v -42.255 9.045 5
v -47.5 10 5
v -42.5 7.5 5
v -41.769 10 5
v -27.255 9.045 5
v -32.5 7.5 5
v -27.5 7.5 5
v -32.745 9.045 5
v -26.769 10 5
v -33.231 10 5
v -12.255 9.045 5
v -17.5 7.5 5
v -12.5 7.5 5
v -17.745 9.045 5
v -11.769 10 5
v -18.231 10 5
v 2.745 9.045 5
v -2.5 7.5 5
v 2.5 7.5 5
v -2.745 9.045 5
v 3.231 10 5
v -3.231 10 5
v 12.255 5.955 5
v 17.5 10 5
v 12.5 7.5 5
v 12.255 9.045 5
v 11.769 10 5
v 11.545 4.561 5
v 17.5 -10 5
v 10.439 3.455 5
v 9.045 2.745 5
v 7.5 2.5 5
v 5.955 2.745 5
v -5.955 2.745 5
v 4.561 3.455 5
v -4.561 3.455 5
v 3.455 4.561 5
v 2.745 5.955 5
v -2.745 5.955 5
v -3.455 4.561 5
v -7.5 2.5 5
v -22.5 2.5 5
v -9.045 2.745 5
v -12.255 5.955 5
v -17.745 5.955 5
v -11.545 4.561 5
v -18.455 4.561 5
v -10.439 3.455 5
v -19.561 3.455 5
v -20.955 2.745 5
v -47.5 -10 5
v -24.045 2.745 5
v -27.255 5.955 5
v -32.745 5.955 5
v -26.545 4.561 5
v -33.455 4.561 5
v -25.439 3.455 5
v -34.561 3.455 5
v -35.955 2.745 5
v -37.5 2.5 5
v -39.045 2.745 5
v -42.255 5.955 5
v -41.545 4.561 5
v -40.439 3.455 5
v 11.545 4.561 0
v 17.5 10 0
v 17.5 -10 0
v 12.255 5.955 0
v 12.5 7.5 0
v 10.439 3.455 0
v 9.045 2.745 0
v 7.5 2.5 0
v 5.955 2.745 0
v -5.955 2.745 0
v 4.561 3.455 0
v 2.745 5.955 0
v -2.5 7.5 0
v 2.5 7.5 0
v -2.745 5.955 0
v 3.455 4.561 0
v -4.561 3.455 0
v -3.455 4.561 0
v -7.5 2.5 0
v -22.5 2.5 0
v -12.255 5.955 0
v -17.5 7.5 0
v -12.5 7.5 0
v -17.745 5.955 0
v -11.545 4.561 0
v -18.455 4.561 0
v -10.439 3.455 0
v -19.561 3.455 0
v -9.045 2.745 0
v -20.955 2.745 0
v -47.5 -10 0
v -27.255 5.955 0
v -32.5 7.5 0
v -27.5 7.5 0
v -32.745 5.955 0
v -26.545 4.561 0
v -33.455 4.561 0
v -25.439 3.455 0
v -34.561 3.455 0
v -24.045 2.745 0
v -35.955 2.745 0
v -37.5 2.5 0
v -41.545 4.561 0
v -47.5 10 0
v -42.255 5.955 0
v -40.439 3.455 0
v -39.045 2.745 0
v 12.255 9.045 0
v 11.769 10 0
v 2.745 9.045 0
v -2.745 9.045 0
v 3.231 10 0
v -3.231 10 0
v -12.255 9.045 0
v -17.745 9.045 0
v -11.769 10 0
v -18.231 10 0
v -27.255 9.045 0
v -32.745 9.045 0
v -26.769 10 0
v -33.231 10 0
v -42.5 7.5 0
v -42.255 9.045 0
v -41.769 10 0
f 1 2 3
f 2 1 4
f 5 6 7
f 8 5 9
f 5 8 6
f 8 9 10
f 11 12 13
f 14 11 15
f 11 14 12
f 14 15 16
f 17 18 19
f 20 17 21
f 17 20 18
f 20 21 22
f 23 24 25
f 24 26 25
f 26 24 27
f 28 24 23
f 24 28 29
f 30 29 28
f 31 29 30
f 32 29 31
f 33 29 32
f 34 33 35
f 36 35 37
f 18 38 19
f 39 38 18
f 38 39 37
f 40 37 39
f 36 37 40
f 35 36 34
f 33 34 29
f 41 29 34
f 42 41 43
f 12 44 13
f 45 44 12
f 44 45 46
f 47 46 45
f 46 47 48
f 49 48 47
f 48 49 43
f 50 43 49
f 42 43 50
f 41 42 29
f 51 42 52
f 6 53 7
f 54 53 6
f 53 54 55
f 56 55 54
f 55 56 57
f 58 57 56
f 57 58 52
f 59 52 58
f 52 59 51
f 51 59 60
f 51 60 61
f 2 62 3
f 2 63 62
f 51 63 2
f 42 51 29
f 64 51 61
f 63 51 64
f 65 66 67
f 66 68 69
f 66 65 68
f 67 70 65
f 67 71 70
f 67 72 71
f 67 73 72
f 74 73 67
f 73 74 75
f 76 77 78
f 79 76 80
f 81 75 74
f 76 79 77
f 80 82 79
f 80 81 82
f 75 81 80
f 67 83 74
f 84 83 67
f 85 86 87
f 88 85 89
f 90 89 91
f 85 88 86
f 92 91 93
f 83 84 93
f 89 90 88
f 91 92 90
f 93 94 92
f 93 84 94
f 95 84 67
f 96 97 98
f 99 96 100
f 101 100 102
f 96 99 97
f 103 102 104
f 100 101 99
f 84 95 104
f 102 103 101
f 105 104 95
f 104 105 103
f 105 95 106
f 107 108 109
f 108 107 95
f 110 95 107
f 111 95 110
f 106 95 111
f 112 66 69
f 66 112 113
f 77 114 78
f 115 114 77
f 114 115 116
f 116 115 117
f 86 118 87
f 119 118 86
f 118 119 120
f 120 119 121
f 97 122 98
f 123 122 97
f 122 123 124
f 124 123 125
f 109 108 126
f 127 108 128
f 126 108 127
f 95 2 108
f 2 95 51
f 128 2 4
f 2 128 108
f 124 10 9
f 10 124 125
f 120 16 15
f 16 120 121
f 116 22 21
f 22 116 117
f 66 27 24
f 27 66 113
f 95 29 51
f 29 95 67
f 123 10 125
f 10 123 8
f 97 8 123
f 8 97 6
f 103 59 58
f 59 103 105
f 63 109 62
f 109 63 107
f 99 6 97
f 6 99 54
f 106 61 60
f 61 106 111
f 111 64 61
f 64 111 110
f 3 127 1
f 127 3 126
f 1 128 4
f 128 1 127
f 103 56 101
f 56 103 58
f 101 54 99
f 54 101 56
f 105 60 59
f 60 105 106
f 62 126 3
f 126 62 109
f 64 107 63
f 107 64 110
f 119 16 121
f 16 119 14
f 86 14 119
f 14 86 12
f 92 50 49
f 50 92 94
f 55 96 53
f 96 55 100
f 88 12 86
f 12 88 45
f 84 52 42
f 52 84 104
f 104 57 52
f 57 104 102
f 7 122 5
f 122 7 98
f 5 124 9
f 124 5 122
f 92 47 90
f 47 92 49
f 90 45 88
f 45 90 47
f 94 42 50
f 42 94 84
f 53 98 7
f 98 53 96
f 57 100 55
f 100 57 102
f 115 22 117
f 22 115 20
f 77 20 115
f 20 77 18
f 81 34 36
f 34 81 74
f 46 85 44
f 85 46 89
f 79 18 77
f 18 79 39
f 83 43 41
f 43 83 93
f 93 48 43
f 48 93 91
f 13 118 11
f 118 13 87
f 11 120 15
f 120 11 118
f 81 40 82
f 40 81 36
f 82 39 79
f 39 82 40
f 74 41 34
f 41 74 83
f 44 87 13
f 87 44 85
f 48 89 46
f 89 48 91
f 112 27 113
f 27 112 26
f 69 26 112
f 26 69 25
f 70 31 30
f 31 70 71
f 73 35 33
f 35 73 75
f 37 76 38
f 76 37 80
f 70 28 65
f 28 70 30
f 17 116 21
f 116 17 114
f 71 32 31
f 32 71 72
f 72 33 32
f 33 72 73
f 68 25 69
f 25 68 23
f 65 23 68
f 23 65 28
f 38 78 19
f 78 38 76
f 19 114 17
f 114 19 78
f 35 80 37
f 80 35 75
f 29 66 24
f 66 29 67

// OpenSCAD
//Number of wires (2-6)
a=4;
//Spark Plug Wire Size (8-11mm)
b=10;

$fn=20;

module holder();
difference(){
    translate([0,0,2.5])cube([95, 20, 5], center=true);
    translate([-37.5,10-.25*b,2.5])cylinder(6,b/2,b/2,center=true);
    translate([-22.5,10-.25*b,2.5])cylinder(6,b/2,b/2,center=true);
    translate([-7.5,10-.25*b,2.5])cylinder(6,b/2,b/2,center=true);
    translate([7.5,10-.25*b,2.5])cylinder(6,b/2,b/2,center=true);
    translate([22.5,10-.25*b,2.5])cylinder(6,b/2,b/2,center=true);
    translate([37.5,10-.25*b,2.5])cylinder(6,b/2,b/2,center=true);
    translate([47.5,0,2.5])cube([180-30*a,22,6],center=true);
}

holder();
